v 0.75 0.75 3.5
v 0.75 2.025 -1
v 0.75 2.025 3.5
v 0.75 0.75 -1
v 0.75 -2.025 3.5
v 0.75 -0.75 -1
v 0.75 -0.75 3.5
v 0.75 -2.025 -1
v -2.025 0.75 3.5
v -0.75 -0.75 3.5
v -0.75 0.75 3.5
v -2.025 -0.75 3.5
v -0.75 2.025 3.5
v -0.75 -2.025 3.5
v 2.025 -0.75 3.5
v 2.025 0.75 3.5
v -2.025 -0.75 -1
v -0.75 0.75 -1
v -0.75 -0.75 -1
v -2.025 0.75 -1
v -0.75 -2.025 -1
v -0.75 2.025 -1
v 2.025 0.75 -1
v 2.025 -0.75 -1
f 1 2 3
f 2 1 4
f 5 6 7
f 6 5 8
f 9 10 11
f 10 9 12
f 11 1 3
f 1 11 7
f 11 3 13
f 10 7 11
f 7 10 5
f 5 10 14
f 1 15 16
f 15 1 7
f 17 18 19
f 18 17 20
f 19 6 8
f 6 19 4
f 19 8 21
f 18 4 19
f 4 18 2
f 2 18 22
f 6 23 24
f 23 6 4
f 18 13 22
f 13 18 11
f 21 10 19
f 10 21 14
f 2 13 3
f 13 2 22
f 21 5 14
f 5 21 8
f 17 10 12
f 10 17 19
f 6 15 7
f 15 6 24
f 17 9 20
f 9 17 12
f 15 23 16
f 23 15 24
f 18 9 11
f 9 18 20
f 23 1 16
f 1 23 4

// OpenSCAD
translate ([0, 0, 1.25]) {
  union () {
    cube ([1.5, 4.05, 4.5], center=true);
    rotate (a=90.0, v=[0, 0, 1]) {
      cube ([1.5, 4.05, 4.5], center=true);
    }
  }
}
